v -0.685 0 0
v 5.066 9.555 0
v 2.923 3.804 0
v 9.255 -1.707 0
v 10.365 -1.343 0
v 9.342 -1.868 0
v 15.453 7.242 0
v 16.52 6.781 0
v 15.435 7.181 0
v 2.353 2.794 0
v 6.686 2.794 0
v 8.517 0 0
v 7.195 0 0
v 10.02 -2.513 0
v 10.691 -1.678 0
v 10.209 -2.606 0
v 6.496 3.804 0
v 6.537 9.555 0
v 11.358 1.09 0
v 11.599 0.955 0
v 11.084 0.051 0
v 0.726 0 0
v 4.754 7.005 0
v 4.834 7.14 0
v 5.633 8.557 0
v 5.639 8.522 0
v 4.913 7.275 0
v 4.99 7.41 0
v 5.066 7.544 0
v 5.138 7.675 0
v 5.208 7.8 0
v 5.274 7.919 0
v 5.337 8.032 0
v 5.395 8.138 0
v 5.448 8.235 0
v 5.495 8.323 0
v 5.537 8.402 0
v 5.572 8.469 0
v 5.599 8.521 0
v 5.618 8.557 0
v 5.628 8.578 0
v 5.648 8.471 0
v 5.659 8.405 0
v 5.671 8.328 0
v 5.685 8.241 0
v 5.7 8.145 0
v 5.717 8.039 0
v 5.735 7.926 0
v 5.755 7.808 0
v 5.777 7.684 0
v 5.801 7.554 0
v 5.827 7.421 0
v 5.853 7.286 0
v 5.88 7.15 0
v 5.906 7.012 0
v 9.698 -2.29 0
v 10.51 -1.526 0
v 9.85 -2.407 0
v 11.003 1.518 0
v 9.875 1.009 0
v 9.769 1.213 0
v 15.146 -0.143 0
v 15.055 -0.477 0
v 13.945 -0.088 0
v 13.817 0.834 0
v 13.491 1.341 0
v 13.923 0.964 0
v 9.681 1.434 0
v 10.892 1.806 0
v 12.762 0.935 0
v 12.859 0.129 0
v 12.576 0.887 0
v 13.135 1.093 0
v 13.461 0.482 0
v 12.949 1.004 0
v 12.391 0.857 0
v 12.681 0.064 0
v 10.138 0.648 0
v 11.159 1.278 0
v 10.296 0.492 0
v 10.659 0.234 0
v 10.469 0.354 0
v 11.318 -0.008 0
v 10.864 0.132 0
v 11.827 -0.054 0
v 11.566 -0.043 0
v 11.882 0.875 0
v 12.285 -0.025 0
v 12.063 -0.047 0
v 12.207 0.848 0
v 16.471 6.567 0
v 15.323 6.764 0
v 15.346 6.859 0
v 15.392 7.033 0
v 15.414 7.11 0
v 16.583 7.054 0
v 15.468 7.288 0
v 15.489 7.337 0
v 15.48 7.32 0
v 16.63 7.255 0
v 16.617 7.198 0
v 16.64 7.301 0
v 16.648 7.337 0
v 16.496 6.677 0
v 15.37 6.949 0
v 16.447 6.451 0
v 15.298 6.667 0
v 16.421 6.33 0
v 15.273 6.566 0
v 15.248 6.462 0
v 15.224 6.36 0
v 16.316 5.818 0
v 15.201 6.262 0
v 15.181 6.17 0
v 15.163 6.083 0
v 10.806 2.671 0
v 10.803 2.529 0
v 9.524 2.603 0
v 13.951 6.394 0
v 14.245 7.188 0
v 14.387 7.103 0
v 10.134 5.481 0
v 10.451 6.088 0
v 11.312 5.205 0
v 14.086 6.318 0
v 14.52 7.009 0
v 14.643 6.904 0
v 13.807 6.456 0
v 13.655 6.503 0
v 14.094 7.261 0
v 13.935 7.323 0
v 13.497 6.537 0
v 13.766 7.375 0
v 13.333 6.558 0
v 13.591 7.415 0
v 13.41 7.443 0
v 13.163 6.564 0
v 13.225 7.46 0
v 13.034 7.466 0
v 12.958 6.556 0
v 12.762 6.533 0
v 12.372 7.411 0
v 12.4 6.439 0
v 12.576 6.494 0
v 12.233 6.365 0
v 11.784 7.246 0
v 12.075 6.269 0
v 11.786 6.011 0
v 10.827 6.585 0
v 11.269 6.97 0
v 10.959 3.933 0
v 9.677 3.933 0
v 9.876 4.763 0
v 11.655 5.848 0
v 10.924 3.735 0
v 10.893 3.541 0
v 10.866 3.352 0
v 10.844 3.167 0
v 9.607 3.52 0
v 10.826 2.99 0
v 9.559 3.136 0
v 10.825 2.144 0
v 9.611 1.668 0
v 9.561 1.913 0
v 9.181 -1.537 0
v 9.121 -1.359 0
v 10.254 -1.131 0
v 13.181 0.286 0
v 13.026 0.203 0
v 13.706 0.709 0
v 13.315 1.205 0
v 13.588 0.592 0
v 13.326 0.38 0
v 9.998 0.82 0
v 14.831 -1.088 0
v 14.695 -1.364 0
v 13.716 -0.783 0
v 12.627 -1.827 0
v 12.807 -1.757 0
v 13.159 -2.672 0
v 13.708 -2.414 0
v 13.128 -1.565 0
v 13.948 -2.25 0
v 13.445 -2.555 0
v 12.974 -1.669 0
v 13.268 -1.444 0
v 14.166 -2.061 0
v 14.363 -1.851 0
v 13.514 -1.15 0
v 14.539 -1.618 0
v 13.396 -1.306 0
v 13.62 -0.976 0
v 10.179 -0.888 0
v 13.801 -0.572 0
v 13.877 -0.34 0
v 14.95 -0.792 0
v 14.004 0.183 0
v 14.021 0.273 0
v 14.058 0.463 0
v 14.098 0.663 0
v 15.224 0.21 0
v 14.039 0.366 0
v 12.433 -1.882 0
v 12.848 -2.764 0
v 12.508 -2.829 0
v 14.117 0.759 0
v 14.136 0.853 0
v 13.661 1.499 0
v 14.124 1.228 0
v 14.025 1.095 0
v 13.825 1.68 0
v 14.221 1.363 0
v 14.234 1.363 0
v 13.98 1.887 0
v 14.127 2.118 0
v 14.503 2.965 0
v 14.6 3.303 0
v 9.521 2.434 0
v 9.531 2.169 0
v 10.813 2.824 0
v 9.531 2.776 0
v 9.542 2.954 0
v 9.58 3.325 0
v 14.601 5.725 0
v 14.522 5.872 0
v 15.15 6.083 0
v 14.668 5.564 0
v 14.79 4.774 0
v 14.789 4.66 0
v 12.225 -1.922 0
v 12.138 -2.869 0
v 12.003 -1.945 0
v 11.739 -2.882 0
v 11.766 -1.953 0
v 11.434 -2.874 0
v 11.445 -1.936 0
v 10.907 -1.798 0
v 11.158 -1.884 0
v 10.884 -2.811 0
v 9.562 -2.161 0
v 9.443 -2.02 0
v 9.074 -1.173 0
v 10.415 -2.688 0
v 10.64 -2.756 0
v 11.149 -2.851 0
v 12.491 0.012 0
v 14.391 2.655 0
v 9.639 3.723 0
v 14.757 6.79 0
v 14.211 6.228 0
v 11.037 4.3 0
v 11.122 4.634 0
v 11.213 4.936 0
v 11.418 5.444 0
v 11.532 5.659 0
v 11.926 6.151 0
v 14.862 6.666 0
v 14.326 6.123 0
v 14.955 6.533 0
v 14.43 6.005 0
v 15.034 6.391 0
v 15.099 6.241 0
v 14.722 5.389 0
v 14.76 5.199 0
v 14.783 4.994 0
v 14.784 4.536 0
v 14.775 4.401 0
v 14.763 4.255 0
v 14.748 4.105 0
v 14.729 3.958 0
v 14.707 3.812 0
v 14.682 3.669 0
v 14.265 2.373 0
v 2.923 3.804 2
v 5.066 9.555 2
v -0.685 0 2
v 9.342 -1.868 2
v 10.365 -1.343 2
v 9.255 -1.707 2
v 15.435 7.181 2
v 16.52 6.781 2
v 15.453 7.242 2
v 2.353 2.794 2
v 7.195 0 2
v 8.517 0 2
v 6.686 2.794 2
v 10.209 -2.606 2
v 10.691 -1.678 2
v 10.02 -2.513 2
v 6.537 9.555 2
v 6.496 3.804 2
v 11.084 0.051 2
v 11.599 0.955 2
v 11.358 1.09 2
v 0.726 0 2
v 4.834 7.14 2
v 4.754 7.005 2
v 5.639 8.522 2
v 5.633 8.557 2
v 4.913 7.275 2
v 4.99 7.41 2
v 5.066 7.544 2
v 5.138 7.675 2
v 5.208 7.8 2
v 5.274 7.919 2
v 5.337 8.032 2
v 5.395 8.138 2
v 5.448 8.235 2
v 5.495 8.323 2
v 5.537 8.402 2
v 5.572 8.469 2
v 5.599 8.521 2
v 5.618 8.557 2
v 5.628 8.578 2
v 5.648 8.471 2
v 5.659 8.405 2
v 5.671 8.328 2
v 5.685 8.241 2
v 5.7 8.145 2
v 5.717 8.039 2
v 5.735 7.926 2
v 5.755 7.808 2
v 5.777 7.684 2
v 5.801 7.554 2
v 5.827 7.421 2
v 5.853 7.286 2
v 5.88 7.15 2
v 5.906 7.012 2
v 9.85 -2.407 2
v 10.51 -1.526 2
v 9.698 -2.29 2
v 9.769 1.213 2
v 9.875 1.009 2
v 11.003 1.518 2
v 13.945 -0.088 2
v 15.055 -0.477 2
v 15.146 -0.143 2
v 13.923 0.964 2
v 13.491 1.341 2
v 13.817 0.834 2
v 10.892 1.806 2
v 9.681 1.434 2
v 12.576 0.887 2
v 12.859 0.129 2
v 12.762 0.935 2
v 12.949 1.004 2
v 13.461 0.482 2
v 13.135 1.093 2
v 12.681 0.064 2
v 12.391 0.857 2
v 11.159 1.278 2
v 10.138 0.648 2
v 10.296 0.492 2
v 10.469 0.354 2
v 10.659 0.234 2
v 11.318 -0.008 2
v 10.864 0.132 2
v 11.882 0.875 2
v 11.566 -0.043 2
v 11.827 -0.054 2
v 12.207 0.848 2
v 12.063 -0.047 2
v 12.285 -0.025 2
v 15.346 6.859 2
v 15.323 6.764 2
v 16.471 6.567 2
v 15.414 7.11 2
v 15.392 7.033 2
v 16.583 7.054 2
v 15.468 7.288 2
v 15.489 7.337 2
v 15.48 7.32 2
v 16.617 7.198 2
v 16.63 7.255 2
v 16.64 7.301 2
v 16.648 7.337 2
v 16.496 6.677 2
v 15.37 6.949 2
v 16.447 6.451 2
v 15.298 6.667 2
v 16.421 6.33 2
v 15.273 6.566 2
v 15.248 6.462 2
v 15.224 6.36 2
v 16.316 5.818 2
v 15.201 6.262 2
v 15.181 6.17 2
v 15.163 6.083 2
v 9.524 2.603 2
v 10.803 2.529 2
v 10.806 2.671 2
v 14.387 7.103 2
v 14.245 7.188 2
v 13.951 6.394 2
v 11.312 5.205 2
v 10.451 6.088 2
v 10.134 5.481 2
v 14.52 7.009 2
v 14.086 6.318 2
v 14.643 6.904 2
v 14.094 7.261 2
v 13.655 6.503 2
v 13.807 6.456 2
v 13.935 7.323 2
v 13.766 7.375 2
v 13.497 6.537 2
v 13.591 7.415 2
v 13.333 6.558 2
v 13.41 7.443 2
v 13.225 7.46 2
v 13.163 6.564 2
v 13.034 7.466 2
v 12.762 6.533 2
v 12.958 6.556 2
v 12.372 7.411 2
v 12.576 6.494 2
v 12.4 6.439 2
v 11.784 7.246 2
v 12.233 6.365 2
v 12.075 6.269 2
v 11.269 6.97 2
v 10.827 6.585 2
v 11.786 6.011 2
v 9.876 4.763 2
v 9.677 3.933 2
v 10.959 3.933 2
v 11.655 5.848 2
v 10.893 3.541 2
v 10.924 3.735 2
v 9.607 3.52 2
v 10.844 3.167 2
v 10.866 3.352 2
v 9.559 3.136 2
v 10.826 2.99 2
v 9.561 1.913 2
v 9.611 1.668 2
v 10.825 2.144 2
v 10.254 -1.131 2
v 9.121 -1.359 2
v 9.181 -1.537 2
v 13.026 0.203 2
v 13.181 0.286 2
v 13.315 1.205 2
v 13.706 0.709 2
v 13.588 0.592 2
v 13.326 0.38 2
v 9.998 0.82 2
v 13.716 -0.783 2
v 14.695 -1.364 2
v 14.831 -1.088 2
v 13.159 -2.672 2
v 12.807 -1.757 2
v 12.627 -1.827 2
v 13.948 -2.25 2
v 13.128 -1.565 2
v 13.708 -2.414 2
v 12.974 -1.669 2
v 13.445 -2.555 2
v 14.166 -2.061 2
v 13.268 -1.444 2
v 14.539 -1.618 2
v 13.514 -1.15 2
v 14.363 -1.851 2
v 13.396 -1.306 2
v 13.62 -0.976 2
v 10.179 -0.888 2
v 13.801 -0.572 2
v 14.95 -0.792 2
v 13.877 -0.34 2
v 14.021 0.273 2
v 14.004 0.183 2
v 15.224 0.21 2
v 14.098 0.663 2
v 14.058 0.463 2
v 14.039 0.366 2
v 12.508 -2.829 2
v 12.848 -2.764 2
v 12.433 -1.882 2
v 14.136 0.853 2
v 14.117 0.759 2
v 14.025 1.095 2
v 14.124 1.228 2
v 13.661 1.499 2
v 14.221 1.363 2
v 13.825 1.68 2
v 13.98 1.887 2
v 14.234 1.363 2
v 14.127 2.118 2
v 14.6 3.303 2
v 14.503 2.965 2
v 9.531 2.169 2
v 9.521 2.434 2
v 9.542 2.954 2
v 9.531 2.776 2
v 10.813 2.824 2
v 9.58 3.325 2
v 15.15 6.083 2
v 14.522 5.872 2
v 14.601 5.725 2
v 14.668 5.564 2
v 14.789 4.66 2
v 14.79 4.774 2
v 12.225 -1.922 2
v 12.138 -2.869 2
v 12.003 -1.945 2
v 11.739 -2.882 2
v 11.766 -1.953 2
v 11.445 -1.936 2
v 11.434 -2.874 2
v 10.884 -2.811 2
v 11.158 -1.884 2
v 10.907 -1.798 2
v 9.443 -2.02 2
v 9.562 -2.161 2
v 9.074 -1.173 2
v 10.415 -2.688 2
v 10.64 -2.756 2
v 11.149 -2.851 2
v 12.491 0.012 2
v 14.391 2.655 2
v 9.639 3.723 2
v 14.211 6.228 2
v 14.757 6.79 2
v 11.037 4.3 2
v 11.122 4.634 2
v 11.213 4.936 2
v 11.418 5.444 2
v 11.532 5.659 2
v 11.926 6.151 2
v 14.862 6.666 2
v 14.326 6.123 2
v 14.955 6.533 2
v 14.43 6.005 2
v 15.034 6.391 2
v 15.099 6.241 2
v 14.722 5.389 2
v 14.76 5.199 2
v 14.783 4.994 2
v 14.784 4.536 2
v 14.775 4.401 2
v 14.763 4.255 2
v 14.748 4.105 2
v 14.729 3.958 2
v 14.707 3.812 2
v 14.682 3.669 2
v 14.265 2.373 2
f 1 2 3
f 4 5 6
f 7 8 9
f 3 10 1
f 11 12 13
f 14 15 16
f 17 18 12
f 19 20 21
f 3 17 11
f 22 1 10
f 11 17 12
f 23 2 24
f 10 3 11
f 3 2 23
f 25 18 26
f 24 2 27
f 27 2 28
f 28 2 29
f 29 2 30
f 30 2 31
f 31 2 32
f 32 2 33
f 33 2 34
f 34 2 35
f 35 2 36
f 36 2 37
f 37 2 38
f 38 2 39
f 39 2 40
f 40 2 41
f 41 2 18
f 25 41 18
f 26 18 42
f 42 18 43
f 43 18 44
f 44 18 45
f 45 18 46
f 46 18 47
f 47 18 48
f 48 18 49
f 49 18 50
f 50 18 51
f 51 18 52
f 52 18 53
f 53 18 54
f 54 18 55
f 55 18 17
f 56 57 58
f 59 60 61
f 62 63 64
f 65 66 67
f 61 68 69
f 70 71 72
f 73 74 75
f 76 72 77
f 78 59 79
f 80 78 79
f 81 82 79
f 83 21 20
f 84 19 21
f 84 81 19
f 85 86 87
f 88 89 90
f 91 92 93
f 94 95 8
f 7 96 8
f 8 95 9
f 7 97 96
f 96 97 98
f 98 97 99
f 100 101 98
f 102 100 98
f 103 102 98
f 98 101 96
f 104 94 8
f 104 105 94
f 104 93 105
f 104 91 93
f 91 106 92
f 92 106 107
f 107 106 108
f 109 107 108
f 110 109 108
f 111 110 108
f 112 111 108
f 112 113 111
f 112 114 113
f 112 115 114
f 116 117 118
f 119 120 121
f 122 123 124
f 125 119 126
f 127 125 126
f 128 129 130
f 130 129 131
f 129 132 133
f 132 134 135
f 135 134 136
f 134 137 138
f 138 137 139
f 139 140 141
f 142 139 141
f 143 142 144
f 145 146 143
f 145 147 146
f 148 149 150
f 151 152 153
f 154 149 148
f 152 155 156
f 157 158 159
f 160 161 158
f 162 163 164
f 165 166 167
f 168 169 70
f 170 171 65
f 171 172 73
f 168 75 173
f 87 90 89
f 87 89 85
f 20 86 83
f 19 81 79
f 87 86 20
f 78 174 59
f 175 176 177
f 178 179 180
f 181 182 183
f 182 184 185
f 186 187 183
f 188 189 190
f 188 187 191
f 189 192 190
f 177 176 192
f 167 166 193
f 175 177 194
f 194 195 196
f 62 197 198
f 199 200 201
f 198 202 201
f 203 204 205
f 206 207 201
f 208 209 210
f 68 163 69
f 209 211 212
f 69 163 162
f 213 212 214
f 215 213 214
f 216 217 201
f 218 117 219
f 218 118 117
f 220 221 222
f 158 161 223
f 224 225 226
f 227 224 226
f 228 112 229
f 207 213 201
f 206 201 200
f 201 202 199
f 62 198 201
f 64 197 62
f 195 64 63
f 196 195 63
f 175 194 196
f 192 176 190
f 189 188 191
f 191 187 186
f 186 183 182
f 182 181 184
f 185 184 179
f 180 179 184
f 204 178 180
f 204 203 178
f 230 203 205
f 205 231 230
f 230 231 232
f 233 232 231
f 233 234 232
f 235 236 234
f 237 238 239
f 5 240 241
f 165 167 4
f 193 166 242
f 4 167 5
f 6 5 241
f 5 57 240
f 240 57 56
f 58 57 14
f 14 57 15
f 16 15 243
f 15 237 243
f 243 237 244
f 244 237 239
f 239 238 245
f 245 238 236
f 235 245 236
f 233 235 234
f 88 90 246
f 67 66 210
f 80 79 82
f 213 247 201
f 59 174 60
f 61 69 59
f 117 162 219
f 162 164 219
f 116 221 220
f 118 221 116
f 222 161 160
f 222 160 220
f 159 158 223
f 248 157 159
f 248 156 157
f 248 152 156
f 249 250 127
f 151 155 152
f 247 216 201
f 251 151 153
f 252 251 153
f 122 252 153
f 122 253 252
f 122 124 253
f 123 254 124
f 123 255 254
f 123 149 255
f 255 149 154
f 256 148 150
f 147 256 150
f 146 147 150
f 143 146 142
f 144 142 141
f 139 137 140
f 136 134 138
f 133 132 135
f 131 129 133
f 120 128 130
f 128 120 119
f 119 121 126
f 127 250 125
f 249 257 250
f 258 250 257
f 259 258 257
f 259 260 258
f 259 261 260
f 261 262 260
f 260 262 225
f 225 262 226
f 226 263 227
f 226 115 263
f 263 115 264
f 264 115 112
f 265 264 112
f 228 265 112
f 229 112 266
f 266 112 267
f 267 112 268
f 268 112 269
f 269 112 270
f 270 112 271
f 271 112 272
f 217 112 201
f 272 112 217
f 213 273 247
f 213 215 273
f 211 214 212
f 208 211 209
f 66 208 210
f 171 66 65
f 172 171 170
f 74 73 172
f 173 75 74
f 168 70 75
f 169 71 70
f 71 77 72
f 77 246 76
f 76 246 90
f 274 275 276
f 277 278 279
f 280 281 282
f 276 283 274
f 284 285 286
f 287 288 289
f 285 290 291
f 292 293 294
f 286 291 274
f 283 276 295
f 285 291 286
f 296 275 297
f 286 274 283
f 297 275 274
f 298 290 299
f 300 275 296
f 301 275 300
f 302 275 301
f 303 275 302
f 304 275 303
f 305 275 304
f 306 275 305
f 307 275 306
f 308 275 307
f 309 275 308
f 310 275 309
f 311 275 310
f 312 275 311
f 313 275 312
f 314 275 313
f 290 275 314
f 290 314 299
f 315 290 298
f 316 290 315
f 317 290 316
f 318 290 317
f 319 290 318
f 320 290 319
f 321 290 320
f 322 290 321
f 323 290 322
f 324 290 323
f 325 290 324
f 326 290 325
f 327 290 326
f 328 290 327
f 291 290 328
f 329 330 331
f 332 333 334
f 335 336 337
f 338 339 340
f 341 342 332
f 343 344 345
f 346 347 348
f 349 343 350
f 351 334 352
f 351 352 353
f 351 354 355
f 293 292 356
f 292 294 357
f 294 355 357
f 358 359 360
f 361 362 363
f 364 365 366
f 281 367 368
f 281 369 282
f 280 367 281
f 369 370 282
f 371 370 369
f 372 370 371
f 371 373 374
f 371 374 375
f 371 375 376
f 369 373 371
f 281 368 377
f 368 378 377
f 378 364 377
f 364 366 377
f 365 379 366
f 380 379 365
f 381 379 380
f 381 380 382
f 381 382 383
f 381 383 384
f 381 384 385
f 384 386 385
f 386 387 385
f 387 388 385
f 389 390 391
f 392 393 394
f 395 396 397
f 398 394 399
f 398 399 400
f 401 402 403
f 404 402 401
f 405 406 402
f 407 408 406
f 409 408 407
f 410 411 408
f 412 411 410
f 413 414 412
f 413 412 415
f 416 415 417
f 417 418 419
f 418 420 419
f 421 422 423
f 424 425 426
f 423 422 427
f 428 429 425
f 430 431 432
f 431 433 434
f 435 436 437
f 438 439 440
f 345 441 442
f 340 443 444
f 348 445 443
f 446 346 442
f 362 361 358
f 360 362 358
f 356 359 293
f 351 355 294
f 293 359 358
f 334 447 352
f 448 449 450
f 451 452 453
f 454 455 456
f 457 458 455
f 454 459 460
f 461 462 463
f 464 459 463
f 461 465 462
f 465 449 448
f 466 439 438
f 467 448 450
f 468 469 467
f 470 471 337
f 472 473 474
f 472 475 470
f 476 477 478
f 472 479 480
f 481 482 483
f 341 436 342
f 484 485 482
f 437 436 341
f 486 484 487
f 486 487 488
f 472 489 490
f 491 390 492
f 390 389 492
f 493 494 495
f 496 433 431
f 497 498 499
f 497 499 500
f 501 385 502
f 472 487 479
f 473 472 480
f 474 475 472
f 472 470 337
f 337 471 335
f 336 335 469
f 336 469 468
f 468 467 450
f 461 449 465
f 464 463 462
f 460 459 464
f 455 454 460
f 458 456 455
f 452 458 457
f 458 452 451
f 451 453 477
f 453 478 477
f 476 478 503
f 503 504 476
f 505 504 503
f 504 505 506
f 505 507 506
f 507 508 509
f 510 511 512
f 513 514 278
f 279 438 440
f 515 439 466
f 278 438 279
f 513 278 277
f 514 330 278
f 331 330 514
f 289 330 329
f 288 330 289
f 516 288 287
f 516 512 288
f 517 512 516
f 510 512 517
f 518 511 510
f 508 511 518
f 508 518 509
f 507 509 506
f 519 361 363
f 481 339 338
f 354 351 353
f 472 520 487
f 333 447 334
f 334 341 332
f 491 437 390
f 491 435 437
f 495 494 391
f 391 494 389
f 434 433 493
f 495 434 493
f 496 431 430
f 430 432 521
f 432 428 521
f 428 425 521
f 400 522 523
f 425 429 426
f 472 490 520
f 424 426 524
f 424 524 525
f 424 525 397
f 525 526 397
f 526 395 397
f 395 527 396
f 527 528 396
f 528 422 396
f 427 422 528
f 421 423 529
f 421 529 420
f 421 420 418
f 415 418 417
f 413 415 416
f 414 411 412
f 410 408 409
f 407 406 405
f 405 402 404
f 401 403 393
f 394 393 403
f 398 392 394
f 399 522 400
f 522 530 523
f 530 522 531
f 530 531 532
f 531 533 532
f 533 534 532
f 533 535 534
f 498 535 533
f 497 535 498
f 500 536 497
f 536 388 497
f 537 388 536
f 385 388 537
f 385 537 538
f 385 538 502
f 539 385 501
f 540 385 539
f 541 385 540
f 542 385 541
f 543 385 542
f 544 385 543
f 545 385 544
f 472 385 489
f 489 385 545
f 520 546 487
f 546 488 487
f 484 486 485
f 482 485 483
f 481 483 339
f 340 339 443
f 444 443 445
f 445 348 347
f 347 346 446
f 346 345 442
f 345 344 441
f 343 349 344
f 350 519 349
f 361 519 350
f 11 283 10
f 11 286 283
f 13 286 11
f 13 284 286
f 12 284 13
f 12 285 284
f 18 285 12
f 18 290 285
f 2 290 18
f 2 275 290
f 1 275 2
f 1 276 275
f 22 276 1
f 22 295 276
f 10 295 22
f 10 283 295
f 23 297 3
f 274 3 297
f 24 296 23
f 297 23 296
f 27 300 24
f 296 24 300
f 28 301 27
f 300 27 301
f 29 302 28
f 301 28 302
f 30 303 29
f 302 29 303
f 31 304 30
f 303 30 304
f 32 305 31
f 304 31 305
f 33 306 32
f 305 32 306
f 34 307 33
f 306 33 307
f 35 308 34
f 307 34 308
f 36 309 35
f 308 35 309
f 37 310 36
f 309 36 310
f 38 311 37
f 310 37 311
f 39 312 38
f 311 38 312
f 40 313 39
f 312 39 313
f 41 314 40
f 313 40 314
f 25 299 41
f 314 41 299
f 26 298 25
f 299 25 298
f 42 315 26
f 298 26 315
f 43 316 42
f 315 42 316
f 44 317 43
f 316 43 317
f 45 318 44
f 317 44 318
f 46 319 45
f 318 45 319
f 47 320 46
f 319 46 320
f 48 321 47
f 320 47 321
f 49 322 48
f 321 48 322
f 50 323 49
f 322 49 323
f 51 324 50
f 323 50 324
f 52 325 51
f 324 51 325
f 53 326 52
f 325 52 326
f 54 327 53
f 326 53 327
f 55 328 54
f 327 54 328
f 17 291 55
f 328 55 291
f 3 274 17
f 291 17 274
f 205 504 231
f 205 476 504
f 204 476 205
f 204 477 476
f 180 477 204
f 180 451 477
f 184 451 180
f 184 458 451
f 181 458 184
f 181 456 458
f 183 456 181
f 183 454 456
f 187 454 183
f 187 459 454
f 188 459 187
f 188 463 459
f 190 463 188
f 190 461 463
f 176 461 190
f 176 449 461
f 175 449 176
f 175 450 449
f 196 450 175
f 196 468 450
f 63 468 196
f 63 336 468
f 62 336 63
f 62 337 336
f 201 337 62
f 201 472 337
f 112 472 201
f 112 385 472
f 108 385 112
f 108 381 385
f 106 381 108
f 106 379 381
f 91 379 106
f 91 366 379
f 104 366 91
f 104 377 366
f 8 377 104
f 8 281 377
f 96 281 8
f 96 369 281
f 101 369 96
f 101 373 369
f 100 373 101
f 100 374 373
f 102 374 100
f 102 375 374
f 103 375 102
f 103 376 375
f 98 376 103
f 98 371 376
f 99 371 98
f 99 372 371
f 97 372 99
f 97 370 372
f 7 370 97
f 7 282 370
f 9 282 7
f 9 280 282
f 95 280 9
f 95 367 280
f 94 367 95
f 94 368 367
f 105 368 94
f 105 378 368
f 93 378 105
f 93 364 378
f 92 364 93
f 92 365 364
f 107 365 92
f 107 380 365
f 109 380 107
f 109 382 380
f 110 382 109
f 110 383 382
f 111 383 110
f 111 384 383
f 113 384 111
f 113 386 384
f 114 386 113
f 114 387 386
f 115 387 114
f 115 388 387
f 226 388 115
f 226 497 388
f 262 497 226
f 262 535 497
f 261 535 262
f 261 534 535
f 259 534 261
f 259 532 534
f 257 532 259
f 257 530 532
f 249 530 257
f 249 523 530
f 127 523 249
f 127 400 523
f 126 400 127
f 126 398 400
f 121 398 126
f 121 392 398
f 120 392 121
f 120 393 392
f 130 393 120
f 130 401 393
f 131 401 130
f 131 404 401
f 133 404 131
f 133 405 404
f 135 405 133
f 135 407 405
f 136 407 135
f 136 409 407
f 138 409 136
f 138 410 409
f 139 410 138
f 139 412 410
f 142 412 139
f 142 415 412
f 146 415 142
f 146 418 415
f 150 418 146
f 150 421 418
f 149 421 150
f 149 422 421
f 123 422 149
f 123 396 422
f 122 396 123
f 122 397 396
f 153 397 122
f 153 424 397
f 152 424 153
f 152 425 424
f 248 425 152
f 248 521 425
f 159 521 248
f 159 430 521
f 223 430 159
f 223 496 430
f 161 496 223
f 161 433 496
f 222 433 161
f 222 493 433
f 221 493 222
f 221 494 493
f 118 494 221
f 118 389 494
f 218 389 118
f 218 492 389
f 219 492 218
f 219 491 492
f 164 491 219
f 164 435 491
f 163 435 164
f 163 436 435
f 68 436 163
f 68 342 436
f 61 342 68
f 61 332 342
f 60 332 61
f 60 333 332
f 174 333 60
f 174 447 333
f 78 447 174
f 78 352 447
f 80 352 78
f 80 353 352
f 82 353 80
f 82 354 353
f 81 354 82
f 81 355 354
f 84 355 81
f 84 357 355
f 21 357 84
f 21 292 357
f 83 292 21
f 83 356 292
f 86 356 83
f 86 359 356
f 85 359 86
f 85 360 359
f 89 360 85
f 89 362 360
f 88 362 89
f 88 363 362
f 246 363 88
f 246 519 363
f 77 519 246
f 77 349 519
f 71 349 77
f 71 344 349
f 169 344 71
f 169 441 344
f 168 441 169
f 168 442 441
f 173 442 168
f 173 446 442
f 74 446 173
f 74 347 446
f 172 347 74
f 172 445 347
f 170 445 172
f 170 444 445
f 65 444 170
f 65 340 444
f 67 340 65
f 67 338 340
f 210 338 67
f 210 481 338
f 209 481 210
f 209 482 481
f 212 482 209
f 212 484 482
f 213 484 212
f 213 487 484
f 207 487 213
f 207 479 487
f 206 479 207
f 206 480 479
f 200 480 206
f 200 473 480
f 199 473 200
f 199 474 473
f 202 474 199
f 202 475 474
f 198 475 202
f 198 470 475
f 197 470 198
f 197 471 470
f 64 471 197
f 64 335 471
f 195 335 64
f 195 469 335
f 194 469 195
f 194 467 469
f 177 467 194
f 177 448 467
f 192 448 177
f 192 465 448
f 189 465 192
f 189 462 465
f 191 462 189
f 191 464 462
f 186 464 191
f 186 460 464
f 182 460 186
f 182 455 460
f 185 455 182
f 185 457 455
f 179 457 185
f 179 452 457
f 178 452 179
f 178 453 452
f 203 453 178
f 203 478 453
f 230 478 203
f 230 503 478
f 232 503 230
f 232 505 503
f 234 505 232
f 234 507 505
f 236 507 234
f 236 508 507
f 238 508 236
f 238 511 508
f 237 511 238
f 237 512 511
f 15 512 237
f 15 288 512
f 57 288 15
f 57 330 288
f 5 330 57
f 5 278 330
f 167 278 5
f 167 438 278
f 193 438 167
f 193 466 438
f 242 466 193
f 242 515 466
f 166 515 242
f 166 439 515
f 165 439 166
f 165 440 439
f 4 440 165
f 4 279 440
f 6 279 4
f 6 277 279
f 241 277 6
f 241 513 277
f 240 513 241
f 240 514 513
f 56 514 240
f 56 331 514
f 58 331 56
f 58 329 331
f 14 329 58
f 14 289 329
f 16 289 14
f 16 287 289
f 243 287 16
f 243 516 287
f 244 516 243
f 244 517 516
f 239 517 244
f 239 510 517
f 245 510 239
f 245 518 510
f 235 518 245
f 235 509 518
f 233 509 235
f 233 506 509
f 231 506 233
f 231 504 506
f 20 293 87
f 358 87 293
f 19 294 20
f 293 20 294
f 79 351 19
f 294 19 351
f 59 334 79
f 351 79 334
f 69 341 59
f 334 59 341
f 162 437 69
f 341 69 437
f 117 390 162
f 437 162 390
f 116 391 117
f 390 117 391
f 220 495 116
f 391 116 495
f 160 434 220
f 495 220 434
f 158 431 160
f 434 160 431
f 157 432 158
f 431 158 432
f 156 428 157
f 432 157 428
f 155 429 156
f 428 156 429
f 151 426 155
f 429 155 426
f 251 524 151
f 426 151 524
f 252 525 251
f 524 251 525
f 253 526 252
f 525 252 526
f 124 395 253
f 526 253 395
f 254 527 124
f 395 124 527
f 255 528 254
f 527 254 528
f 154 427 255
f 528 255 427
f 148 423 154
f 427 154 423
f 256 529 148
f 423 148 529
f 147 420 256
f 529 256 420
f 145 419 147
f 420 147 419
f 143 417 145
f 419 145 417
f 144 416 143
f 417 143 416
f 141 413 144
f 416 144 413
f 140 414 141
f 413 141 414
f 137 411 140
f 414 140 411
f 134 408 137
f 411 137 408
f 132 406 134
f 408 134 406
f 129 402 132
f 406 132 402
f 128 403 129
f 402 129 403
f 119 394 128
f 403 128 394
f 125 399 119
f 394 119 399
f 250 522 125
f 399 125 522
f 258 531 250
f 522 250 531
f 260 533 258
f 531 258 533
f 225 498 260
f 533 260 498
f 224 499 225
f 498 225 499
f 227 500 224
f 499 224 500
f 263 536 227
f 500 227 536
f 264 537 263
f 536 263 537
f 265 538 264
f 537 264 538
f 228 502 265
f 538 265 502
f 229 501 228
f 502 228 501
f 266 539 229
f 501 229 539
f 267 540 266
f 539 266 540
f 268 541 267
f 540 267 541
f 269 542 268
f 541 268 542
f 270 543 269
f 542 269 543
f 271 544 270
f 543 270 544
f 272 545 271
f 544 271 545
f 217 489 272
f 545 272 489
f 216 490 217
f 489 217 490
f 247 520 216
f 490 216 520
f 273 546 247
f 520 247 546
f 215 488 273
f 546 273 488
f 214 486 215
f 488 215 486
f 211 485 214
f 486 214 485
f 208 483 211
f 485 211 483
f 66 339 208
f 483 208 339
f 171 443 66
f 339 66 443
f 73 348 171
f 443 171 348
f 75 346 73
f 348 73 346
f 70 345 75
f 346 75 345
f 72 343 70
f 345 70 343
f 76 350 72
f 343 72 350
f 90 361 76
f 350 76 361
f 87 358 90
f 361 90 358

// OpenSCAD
// oracle: vol-tol 0.005
linear_extrude(2) text("Ag", font="Liberation Sans:style=Italic");
